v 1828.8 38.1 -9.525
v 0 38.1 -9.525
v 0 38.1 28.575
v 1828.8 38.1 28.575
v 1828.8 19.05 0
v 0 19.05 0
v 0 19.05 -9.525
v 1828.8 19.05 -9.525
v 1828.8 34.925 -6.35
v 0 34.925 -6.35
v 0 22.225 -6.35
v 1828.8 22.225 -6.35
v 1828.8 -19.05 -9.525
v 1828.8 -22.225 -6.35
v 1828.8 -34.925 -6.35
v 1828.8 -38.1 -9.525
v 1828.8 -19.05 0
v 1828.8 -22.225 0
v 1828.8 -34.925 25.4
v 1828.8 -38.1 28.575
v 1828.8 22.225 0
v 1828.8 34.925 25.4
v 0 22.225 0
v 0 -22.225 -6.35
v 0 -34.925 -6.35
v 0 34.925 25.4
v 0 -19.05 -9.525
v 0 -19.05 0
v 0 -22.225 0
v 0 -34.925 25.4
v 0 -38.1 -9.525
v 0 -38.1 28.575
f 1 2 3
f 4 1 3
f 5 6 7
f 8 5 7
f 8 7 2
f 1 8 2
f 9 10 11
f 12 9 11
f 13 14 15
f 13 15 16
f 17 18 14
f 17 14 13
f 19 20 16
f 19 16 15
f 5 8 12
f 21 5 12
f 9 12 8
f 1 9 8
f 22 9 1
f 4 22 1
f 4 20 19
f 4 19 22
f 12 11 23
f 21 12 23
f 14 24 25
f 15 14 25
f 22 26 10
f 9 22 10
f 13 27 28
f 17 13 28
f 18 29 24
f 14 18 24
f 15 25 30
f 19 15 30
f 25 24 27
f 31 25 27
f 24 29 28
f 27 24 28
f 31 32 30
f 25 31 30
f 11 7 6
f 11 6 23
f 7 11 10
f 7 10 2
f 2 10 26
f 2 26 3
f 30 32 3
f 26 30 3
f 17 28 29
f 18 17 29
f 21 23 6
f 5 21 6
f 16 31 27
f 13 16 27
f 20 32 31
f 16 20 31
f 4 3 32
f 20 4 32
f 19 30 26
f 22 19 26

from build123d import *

# Parameters (mm, degrees)
F1_DEPTH = 1828.8


with BuildPart() as f1:
    # F0 (on Right) → F1 (new body)
    with BuildSketch(Plane.YZ):
        Polygon((-19.05, -9.525), (-19.05, 0), (-22.225, 0), (-22.225, -6.35), (-34.925, -6.35), (-34.925, 25.4), (0, 25.4), (34.925, 25.4), (34.925, -6.35), (22.225, -6.35), (22.225, 0), (19.05, 0), (19.05, -9.525), (38.1, -9.525), (38.1, 28.575), (0, 28.575), (-38.1, 28.575), (-38.1, -9.525), align=None)
    extrude(amount=F1_DEPTH)


solid = f1.part
